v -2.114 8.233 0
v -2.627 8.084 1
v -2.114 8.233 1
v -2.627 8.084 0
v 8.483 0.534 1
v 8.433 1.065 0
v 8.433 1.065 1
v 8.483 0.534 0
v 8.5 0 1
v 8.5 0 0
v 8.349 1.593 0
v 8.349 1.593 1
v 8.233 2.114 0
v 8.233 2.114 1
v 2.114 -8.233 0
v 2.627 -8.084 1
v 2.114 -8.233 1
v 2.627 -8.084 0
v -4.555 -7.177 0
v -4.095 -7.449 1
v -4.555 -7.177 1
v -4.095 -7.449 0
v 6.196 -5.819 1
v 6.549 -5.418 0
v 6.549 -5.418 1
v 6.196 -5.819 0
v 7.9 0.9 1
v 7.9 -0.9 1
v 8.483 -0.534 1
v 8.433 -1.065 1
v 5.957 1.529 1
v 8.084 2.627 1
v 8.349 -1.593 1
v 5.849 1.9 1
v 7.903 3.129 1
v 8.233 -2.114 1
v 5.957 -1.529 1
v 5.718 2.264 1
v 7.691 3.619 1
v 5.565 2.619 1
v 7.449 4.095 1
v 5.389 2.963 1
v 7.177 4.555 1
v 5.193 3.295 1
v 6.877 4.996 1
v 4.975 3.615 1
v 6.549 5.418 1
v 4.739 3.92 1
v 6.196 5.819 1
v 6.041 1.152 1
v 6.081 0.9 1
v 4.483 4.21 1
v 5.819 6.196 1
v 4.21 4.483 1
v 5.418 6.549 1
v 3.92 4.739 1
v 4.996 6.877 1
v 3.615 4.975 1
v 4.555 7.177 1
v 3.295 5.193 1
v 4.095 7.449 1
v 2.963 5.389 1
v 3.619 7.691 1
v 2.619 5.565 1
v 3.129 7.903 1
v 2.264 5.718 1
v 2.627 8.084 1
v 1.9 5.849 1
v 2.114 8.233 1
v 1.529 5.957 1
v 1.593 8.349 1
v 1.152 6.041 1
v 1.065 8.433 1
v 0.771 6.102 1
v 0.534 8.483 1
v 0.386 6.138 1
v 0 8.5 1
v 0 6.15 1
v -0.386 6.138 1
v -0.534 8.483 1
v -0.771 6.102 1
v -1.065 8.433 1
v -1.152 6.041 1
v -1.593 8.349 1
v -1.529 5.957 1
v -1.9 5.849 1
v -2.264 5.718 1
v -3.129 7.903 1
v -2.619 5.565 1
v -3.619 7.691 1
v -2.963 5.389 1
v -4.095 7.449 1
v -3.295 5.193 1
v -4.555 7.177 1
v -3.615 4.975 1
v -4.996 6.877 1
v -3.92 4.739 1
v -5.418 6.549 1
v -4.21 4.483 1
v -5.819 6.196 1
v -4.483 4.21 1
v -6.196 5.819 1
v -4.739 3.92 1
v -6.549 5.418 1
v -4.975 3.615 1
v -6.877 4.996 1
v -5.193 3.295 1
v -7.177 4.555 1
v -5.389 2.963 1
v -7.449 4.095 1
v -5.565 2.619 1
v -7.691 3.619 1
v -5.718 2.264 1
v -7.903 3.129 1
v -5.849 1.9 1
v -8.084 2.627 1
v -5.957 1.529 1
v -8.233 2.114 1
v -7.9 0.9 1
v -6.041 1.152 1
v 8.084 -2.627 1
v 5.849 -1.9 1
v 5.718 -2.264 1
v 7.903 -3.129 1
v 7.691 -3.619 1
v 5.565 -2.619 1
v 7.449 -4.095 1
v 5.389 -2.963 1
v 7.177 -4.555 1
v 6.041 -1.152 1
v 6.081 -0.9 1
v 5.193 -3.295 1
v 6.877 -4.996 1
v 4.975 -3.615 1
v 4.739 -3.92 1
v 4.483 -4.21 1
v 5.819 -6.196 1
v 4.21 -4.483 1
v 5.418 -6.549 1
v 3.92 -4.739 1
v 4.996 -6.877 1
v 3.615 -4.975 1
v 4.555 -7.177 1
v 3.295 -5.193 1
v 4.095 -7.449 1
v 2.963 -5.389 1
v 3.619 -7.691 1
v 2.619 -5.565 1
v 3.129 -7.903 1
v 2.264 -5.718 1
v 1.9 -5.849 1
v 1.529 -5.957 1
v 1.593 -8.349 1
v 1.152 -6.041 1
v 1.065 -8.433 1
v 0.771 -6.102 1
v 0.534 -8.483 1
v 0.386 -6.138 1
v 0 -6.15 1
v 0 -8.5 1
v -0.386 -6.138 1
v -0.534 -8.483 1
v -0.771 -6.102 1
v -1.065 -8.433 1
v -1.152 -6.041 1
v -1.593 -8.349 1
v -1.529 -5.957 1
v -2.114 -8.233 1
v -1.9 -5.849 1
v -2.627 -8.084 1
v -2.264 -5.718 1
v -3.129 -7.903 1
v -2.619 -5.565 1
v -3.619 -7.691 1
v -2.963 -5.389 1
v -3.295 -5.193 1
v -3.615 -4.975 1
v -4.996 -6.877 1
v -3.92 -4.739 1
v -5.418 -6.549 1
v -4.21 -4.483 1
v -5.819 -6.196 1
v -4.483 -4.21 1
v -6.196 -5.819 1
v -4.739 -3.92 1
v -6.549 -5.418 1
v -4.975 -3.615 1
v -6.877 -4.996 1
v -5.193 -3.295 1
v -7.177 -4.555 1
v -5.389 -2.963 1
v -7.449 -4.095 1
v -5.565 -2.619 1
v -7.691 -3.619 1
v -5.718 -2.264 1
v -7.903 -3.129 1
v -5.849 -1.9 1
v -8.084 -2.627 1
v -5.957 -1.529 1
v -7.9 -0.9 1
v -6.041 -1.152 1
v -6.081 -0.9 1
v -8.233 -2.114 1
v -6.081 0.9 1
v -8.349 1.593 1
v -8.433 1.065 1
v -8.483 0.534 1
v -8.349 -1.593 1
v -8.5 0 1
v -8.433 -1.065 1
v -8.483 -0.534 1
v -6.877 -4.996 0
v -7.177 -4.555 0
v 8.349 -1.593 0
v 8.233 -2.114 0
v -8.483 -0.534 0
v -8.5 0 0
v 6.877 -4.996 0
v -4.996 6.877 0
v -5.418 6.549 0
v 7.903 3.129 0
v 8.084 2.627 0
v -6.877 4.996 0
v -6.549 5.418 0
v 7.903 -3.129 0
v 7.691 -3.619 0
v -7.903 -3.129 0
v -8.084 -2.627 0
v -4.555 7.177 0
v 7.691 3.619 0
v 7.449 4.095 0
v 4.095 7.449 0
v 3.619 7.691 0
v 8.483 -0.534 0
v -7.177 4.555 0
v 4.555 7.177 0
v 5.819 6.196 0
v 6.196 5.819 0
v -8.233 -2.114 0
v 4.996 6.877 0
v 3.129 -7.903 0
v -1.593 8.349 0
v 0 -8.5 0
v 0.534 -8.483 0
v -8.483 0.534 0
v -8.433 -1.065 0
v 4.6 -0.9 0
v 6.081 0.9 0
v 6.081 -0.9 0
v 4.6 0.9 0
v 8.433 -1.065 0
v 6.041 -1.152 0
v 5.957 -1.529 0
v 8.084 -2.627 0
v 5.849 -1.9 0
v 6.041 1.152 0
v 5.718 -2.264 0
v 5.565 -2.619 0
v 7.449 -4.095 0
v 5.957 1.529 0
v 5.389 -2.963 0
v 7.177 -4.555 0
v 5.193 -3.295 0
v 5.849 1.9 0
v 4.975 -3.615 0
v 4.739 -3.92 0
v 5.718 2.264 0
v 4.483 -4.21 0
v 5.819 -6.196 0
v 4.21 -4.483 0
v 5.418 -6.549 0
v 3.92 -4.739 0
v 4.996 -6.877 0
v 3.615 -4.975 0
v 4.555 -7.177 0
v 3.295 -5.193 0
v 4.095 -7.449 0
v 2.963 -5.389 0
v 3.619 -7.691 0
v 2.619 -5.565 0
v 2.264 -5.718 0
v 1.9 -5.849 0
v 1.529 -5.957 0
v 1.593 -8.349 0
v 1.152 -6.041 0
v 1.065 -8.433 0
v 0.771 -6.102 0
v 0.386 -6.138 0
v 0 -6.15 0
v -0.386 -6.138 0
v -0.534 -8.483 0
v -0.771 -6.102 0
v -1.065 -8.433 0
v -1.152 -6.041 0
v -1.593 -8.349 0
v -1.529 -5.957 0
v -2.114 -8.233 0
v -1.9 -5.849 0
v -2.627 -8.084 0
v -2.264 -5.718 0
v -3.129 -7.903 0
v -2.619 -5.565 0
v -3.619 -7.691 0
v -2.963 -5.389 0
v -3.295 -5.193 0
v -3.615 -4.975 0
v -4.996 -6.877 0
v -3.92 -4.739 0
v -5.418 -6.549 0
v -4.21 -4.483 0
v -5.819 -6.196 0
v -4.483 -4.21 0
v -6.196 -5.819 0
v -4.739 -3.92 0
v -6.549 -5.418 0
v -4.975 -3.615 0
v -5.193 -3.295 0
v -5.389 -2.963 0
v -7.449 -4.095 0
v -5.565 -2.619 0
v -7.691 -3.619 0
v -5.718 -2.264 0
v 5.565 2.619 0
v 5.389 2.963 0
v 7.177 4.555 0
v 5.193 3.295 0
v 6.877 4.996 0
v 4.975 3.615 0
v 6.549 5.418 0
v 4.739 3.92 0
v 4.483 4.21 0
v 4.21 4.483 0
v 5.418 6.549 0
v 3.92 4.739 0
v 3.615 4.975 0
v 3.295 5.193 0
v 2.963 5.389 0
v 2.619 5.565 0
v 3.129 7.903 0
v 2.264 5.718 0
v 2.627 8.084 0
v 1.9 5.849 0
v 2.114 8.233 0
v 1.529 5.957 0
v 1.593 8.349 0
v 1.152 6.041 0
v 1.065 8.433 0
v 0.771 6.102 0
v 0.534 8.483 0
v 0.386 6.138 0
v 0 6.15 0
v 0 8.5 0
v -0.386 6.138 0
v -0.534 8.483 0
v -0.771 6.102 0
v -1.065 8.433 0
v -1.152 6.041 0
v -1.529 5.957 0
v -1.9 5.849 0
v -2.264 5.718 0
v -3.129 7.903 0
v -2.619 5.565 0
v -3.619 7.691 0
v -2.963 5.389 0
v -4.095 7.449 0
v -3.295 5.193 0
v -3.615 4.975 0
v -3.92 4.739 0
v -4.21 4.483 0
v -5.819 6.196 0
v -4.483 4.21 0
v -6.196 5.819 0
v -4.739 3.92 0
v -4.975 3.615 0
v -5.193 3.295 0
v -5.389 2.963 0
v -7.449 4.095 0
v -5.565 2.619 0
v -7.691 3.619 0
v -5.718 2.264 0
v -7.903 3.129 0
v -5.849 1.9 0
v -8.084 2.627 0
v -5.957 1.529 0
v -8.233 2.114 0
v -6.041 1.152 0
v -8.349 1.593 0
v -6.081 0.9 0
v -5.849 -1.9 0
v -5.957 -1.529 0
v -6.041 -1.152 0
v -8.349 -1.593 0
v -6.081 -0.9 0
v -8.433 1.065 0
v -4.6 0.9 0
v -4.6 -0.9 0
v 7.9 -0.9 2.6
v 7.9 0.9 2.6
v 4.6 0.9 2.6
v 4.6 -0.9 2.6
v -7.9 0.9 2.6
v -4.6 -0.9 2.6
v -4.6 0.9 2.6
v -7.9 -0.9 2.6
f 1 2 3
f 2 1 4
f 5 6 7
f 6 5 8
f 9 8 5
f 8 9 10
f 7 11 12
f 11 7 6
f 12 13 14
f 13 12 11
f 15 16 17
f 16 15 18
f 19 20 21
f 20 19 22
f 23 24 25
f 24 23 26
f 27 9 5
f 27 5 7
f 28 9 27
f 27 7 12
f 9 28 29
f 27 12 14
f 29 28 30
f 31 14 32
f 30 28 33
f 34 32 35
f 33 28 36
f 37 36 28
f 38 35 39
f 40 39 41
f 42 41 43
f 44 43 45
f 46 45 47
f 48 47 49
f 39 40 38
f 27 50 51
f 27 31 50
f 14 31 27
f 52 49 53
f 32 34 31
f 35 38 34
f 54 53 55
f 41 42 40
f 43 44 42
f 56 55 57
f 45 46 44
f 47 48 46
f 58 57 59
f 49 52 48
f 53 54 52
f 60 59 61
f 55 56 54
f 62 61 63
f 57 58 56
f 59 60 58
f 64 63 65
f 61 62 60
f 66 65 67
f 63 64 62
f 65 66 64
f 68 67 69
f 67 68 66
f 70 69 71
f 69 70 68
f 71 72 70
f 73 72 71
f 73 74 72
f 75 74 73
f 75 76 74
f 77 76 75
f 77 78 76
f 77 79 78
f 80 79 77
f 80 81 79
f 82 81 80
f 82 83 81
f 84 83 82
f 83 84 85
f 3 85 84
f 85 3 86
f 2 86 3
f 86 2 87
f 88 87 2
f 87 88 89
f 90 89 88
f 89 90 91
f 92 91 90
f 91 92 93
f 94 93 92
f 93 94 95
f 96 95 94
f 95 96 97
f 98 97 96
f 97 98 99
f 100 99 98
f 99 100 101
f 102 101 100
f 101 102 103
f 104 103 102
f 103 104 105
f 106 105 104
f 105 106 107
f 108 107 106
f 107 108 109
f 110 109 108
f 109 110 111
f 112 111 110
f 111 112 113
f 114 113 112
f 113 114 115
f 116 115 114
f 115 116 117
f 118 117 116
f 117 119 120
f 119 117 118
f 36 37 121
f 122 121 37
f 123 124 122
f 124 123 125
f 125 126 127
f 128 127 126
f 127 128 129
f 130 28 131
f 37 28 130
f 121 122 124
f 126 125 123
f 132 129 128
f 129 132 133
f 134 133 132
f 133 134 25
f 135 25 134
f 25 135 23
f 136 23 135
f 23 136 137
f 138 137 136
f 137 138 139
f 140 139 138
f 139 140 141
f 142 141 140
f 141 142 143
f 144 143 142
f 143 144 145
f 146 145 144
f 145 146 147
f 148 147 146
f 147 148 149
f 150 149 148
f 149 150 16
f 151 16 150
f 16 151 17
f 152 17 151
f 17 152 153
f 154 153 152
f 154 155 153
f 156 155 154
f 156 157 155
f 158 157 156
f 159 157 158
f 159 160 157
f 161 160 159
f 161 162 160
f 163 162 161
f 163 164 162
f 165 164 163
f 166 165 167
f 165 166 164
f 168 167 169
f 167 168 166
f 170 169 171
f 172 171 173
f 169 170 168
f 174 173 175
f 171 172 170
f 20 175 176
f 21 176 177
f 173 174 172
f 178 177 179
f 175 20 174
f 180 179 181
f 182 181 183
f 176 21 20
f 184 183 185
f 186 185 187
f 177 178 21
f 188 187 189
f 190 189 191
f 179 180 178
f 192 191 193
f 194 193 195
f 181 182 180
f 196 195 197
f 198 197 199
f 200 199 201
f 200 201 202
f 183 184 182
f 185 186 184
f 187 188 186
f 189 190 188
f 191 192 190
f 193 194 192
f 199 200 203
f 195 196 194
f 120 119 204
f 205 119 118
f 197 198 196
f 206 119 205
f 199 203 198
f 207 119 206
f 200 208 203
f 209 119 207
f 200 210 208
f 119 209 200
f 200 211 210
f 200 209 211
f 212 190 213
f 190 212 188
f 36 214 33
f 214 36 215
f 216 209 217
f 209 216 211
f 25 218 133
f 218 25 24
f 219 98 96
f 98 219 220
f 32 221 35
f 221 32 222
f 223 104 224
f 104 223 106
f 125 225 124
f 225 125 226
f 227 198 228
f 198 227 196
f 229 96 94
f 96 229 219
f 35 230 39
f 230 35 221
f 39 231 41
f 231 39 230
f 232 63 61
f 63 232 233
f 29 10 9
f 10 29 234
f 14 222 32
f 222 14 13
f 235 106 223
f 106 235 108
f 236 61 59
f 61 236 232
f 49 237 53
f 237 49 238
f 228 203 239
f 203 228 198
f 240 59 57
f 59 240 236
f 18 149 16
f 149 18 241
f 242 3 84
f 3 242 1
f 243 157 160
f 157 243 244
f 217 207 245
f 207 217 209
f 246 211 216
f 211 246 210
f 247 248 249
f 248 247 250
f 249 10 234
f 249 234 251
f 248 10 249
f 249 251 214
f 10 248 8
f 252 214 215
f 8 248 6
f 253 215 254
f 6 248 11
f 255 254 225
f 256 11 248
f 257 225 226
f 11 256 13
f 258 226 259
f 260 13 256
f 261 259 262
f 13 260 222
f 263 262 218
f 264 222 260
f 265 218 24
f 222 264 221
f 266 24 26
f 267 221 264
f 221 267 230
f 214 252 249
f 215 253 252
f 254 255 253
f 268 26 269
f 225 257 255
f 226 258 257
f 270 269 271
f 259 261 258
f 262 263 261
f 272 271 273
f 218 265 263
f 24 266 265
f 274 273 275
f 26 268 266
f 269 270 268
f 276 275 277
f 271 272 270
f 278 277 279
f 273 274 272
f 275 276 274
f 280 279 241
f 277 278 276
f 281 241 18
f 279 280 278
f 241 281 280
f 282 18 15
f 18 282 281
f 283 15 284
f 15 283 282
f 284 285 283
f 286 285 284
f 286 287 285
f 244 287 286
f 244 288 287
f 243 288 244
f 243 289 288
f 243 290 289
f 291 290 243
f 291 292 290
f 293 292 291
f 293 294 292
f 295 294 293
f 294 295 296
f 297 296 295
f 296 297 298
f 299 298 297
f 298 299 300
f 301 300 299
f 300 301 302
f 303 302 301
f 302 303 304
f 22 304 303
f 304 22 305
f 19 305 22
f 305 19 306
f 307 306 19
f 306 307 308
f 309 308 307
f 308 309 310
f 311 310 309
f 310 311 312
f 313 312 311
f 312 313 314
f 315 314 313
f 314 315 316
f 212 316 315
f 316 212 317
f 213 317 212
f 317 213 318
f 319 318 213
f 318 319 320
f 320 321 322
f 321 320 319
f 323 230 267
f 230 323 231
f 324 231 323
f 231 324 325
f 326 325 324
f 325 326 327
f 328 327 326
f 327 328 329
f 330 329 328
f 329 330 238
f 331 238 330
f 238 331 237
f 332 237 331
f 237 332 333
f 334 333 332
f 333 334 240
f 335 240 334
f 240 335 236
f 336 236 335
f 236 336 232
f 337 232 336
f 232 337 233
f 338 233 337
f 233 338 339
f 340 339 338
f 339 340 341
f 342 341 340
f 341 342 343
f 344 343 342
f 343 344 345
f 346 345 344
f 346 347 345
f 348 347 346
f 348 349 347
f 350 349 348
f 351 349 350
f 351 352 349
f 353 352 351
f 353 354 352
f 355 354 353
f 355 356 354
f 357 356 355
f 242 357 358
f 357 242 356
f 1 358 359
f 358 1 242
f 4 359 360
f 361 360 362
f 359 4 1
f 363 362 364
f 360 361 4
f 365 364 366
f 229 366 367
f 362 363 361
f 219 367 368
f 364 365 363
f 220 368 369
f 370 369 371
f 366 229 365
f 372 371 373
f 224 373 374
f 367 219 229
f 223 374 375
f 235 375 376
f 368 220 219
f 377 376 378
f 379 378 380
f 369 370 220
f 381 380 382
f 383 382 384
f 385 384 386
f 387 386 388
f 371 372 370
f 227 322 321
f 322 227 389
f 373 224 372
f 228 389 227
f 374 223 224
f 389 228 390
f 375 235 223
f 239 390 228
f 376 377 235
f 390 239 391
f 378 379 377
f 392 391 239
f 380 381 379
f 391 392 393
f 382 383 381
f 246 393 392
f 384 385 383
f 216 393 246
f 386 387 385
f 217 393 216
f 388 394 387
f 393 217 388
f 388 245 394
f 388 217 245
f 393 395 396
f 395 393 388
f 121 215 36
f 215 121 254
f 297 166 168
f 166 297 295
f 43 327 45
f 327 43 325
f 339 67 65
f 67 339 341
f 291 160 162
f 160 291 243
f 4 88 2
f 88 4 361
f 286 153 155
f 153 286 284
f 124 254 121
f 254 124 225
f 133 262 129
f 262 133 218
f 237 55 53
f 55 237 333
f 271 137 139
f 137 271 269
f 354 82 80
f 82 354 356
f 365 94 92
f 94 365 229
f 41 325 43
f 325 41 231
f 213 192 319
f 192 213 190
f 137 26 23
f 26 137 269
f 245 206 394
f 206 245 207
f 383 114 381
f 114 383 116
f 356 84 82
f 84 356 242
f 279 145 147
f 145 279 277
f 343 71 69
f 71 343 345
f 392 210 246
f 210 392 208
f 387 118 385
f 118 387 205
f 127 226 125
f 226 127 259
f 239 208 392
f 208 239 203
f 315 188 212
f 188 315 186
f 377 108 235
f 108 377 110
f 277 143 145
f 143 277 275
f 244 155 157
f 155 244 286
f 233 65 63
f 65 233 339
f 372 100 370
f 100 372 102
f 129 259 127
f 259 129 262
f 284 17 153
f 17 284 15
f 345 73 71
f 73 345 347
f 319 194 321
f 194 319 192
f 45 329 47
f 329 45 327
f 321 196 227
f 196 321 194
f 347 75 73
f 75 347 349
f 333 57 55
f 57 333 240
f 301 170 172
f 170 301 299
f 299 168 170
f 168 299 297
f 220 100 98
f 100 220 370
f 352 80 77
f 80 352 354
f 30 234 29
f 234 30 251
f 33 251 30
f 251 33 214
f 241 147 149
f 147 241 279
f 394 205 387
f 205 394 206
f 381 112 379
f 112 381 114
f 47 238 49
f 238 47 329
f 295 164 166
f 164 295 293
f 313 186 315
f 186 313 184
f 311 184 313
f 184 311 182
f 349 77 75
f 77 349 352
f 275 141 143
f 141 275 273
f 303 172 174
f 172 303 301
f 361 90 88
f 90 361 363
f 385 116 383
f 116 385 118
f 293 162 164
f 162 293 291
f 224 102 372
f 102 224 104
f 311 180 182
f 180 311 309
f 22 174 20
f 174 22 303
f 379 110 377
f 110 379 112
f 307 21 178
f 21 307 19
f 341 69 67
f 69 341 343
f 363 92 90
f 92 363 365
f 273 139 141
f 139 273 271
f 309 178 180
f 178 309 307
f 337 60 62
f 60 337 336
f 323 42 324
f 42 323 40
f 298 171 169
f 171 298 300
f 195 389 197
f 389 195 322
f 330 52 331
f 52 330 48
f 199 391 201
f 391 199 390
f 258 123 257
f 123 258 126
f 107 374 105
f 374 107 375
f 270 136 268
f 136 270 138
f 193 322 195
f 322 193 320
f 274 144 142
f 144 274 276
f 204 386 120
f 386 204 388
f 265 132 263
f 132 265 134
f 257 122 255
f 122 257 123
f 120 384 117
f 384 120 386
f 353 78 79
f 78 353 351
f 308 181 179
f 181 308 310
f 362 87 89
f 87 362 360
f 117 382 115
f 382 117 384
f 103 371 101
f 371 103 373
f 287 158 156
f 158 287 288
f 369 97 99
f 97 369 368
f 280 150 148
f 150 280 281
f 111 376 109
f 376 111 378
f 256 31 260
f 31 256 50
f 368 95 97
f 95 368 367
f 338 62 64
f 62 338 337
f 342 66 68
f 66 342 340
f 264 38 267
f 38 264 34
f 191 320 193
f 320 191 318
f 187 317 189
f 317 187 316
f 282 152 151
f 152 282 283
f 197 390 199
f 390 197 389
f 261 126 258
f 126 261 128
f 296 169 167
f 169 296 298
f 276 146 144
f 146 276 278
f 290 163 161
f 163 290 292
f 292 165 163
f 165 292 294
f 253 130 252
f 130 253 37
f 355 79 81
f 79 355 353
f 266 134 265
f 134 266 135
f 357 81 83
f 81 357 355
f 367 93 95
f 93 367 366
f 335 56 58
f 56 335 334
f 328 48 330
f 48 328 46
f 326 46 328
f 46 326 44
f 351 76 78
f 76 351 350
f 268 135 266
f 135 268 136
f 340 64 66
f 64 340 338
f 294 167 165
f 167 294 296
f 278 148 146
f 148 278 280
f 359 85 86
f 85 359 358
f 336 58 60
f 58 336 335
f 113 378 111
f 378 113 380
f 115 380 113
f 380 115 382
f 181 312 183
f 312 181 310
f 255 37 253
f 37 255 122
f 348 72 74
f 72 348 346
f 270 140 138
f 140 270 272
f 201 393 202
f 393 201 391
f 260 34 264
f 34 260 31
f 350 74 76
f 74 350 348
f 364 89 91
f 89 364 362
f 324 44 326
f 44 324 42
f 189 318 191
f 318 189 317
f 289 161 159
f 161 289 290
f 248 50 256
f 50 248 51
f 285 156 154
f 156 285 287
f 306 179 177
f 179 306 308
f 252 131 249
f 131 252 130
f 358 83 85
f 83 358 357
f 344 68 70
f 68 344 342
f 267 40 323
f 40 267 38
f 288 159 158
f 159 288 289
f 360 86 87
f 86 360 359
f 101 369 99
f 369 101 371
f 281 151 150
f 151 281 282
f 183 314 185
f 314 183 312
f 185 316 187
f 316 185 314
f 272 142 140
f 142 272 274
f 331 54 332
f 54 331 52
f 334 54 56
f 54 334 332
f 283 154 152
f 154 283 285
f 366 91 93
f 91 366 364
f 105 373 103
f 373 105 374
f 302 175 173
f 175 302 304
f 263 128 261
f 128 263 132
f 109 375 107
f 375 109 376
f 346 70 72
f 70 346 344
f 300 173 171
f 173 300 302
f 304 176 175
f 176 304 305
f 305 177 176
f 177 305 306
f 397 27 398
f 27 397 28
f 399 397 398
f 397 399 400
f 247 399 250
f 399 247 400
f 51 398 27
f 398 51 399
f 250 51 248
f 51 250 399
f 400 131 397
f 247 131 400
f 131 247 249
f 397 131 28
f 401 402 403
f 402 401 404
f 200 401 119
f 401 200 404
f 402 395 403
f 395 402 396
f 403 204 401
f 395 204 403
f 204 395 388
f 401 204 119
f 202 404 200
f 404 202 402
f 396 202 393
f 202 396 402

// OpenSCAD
$fn=100;

module rotor1_4() {
    margin = 0.3;
    thread_diameter = 12 + margin;
    height = 1;
    difference() {
        translate([0, 0, height/2])
        cylinder(r=17/2,h=height,center=true);
        cylinder(r=thread_diameter/2,h=100,center=true);
    }
    for(i=[0:1])
    {
        mirror([i,0,0])
        translate([3.5/2+9/2,0,(height+1.6)/2])
        cube([3.5-0.2,2-0.2,height+1.6], center=true);
    }
}
rotor1_4();
